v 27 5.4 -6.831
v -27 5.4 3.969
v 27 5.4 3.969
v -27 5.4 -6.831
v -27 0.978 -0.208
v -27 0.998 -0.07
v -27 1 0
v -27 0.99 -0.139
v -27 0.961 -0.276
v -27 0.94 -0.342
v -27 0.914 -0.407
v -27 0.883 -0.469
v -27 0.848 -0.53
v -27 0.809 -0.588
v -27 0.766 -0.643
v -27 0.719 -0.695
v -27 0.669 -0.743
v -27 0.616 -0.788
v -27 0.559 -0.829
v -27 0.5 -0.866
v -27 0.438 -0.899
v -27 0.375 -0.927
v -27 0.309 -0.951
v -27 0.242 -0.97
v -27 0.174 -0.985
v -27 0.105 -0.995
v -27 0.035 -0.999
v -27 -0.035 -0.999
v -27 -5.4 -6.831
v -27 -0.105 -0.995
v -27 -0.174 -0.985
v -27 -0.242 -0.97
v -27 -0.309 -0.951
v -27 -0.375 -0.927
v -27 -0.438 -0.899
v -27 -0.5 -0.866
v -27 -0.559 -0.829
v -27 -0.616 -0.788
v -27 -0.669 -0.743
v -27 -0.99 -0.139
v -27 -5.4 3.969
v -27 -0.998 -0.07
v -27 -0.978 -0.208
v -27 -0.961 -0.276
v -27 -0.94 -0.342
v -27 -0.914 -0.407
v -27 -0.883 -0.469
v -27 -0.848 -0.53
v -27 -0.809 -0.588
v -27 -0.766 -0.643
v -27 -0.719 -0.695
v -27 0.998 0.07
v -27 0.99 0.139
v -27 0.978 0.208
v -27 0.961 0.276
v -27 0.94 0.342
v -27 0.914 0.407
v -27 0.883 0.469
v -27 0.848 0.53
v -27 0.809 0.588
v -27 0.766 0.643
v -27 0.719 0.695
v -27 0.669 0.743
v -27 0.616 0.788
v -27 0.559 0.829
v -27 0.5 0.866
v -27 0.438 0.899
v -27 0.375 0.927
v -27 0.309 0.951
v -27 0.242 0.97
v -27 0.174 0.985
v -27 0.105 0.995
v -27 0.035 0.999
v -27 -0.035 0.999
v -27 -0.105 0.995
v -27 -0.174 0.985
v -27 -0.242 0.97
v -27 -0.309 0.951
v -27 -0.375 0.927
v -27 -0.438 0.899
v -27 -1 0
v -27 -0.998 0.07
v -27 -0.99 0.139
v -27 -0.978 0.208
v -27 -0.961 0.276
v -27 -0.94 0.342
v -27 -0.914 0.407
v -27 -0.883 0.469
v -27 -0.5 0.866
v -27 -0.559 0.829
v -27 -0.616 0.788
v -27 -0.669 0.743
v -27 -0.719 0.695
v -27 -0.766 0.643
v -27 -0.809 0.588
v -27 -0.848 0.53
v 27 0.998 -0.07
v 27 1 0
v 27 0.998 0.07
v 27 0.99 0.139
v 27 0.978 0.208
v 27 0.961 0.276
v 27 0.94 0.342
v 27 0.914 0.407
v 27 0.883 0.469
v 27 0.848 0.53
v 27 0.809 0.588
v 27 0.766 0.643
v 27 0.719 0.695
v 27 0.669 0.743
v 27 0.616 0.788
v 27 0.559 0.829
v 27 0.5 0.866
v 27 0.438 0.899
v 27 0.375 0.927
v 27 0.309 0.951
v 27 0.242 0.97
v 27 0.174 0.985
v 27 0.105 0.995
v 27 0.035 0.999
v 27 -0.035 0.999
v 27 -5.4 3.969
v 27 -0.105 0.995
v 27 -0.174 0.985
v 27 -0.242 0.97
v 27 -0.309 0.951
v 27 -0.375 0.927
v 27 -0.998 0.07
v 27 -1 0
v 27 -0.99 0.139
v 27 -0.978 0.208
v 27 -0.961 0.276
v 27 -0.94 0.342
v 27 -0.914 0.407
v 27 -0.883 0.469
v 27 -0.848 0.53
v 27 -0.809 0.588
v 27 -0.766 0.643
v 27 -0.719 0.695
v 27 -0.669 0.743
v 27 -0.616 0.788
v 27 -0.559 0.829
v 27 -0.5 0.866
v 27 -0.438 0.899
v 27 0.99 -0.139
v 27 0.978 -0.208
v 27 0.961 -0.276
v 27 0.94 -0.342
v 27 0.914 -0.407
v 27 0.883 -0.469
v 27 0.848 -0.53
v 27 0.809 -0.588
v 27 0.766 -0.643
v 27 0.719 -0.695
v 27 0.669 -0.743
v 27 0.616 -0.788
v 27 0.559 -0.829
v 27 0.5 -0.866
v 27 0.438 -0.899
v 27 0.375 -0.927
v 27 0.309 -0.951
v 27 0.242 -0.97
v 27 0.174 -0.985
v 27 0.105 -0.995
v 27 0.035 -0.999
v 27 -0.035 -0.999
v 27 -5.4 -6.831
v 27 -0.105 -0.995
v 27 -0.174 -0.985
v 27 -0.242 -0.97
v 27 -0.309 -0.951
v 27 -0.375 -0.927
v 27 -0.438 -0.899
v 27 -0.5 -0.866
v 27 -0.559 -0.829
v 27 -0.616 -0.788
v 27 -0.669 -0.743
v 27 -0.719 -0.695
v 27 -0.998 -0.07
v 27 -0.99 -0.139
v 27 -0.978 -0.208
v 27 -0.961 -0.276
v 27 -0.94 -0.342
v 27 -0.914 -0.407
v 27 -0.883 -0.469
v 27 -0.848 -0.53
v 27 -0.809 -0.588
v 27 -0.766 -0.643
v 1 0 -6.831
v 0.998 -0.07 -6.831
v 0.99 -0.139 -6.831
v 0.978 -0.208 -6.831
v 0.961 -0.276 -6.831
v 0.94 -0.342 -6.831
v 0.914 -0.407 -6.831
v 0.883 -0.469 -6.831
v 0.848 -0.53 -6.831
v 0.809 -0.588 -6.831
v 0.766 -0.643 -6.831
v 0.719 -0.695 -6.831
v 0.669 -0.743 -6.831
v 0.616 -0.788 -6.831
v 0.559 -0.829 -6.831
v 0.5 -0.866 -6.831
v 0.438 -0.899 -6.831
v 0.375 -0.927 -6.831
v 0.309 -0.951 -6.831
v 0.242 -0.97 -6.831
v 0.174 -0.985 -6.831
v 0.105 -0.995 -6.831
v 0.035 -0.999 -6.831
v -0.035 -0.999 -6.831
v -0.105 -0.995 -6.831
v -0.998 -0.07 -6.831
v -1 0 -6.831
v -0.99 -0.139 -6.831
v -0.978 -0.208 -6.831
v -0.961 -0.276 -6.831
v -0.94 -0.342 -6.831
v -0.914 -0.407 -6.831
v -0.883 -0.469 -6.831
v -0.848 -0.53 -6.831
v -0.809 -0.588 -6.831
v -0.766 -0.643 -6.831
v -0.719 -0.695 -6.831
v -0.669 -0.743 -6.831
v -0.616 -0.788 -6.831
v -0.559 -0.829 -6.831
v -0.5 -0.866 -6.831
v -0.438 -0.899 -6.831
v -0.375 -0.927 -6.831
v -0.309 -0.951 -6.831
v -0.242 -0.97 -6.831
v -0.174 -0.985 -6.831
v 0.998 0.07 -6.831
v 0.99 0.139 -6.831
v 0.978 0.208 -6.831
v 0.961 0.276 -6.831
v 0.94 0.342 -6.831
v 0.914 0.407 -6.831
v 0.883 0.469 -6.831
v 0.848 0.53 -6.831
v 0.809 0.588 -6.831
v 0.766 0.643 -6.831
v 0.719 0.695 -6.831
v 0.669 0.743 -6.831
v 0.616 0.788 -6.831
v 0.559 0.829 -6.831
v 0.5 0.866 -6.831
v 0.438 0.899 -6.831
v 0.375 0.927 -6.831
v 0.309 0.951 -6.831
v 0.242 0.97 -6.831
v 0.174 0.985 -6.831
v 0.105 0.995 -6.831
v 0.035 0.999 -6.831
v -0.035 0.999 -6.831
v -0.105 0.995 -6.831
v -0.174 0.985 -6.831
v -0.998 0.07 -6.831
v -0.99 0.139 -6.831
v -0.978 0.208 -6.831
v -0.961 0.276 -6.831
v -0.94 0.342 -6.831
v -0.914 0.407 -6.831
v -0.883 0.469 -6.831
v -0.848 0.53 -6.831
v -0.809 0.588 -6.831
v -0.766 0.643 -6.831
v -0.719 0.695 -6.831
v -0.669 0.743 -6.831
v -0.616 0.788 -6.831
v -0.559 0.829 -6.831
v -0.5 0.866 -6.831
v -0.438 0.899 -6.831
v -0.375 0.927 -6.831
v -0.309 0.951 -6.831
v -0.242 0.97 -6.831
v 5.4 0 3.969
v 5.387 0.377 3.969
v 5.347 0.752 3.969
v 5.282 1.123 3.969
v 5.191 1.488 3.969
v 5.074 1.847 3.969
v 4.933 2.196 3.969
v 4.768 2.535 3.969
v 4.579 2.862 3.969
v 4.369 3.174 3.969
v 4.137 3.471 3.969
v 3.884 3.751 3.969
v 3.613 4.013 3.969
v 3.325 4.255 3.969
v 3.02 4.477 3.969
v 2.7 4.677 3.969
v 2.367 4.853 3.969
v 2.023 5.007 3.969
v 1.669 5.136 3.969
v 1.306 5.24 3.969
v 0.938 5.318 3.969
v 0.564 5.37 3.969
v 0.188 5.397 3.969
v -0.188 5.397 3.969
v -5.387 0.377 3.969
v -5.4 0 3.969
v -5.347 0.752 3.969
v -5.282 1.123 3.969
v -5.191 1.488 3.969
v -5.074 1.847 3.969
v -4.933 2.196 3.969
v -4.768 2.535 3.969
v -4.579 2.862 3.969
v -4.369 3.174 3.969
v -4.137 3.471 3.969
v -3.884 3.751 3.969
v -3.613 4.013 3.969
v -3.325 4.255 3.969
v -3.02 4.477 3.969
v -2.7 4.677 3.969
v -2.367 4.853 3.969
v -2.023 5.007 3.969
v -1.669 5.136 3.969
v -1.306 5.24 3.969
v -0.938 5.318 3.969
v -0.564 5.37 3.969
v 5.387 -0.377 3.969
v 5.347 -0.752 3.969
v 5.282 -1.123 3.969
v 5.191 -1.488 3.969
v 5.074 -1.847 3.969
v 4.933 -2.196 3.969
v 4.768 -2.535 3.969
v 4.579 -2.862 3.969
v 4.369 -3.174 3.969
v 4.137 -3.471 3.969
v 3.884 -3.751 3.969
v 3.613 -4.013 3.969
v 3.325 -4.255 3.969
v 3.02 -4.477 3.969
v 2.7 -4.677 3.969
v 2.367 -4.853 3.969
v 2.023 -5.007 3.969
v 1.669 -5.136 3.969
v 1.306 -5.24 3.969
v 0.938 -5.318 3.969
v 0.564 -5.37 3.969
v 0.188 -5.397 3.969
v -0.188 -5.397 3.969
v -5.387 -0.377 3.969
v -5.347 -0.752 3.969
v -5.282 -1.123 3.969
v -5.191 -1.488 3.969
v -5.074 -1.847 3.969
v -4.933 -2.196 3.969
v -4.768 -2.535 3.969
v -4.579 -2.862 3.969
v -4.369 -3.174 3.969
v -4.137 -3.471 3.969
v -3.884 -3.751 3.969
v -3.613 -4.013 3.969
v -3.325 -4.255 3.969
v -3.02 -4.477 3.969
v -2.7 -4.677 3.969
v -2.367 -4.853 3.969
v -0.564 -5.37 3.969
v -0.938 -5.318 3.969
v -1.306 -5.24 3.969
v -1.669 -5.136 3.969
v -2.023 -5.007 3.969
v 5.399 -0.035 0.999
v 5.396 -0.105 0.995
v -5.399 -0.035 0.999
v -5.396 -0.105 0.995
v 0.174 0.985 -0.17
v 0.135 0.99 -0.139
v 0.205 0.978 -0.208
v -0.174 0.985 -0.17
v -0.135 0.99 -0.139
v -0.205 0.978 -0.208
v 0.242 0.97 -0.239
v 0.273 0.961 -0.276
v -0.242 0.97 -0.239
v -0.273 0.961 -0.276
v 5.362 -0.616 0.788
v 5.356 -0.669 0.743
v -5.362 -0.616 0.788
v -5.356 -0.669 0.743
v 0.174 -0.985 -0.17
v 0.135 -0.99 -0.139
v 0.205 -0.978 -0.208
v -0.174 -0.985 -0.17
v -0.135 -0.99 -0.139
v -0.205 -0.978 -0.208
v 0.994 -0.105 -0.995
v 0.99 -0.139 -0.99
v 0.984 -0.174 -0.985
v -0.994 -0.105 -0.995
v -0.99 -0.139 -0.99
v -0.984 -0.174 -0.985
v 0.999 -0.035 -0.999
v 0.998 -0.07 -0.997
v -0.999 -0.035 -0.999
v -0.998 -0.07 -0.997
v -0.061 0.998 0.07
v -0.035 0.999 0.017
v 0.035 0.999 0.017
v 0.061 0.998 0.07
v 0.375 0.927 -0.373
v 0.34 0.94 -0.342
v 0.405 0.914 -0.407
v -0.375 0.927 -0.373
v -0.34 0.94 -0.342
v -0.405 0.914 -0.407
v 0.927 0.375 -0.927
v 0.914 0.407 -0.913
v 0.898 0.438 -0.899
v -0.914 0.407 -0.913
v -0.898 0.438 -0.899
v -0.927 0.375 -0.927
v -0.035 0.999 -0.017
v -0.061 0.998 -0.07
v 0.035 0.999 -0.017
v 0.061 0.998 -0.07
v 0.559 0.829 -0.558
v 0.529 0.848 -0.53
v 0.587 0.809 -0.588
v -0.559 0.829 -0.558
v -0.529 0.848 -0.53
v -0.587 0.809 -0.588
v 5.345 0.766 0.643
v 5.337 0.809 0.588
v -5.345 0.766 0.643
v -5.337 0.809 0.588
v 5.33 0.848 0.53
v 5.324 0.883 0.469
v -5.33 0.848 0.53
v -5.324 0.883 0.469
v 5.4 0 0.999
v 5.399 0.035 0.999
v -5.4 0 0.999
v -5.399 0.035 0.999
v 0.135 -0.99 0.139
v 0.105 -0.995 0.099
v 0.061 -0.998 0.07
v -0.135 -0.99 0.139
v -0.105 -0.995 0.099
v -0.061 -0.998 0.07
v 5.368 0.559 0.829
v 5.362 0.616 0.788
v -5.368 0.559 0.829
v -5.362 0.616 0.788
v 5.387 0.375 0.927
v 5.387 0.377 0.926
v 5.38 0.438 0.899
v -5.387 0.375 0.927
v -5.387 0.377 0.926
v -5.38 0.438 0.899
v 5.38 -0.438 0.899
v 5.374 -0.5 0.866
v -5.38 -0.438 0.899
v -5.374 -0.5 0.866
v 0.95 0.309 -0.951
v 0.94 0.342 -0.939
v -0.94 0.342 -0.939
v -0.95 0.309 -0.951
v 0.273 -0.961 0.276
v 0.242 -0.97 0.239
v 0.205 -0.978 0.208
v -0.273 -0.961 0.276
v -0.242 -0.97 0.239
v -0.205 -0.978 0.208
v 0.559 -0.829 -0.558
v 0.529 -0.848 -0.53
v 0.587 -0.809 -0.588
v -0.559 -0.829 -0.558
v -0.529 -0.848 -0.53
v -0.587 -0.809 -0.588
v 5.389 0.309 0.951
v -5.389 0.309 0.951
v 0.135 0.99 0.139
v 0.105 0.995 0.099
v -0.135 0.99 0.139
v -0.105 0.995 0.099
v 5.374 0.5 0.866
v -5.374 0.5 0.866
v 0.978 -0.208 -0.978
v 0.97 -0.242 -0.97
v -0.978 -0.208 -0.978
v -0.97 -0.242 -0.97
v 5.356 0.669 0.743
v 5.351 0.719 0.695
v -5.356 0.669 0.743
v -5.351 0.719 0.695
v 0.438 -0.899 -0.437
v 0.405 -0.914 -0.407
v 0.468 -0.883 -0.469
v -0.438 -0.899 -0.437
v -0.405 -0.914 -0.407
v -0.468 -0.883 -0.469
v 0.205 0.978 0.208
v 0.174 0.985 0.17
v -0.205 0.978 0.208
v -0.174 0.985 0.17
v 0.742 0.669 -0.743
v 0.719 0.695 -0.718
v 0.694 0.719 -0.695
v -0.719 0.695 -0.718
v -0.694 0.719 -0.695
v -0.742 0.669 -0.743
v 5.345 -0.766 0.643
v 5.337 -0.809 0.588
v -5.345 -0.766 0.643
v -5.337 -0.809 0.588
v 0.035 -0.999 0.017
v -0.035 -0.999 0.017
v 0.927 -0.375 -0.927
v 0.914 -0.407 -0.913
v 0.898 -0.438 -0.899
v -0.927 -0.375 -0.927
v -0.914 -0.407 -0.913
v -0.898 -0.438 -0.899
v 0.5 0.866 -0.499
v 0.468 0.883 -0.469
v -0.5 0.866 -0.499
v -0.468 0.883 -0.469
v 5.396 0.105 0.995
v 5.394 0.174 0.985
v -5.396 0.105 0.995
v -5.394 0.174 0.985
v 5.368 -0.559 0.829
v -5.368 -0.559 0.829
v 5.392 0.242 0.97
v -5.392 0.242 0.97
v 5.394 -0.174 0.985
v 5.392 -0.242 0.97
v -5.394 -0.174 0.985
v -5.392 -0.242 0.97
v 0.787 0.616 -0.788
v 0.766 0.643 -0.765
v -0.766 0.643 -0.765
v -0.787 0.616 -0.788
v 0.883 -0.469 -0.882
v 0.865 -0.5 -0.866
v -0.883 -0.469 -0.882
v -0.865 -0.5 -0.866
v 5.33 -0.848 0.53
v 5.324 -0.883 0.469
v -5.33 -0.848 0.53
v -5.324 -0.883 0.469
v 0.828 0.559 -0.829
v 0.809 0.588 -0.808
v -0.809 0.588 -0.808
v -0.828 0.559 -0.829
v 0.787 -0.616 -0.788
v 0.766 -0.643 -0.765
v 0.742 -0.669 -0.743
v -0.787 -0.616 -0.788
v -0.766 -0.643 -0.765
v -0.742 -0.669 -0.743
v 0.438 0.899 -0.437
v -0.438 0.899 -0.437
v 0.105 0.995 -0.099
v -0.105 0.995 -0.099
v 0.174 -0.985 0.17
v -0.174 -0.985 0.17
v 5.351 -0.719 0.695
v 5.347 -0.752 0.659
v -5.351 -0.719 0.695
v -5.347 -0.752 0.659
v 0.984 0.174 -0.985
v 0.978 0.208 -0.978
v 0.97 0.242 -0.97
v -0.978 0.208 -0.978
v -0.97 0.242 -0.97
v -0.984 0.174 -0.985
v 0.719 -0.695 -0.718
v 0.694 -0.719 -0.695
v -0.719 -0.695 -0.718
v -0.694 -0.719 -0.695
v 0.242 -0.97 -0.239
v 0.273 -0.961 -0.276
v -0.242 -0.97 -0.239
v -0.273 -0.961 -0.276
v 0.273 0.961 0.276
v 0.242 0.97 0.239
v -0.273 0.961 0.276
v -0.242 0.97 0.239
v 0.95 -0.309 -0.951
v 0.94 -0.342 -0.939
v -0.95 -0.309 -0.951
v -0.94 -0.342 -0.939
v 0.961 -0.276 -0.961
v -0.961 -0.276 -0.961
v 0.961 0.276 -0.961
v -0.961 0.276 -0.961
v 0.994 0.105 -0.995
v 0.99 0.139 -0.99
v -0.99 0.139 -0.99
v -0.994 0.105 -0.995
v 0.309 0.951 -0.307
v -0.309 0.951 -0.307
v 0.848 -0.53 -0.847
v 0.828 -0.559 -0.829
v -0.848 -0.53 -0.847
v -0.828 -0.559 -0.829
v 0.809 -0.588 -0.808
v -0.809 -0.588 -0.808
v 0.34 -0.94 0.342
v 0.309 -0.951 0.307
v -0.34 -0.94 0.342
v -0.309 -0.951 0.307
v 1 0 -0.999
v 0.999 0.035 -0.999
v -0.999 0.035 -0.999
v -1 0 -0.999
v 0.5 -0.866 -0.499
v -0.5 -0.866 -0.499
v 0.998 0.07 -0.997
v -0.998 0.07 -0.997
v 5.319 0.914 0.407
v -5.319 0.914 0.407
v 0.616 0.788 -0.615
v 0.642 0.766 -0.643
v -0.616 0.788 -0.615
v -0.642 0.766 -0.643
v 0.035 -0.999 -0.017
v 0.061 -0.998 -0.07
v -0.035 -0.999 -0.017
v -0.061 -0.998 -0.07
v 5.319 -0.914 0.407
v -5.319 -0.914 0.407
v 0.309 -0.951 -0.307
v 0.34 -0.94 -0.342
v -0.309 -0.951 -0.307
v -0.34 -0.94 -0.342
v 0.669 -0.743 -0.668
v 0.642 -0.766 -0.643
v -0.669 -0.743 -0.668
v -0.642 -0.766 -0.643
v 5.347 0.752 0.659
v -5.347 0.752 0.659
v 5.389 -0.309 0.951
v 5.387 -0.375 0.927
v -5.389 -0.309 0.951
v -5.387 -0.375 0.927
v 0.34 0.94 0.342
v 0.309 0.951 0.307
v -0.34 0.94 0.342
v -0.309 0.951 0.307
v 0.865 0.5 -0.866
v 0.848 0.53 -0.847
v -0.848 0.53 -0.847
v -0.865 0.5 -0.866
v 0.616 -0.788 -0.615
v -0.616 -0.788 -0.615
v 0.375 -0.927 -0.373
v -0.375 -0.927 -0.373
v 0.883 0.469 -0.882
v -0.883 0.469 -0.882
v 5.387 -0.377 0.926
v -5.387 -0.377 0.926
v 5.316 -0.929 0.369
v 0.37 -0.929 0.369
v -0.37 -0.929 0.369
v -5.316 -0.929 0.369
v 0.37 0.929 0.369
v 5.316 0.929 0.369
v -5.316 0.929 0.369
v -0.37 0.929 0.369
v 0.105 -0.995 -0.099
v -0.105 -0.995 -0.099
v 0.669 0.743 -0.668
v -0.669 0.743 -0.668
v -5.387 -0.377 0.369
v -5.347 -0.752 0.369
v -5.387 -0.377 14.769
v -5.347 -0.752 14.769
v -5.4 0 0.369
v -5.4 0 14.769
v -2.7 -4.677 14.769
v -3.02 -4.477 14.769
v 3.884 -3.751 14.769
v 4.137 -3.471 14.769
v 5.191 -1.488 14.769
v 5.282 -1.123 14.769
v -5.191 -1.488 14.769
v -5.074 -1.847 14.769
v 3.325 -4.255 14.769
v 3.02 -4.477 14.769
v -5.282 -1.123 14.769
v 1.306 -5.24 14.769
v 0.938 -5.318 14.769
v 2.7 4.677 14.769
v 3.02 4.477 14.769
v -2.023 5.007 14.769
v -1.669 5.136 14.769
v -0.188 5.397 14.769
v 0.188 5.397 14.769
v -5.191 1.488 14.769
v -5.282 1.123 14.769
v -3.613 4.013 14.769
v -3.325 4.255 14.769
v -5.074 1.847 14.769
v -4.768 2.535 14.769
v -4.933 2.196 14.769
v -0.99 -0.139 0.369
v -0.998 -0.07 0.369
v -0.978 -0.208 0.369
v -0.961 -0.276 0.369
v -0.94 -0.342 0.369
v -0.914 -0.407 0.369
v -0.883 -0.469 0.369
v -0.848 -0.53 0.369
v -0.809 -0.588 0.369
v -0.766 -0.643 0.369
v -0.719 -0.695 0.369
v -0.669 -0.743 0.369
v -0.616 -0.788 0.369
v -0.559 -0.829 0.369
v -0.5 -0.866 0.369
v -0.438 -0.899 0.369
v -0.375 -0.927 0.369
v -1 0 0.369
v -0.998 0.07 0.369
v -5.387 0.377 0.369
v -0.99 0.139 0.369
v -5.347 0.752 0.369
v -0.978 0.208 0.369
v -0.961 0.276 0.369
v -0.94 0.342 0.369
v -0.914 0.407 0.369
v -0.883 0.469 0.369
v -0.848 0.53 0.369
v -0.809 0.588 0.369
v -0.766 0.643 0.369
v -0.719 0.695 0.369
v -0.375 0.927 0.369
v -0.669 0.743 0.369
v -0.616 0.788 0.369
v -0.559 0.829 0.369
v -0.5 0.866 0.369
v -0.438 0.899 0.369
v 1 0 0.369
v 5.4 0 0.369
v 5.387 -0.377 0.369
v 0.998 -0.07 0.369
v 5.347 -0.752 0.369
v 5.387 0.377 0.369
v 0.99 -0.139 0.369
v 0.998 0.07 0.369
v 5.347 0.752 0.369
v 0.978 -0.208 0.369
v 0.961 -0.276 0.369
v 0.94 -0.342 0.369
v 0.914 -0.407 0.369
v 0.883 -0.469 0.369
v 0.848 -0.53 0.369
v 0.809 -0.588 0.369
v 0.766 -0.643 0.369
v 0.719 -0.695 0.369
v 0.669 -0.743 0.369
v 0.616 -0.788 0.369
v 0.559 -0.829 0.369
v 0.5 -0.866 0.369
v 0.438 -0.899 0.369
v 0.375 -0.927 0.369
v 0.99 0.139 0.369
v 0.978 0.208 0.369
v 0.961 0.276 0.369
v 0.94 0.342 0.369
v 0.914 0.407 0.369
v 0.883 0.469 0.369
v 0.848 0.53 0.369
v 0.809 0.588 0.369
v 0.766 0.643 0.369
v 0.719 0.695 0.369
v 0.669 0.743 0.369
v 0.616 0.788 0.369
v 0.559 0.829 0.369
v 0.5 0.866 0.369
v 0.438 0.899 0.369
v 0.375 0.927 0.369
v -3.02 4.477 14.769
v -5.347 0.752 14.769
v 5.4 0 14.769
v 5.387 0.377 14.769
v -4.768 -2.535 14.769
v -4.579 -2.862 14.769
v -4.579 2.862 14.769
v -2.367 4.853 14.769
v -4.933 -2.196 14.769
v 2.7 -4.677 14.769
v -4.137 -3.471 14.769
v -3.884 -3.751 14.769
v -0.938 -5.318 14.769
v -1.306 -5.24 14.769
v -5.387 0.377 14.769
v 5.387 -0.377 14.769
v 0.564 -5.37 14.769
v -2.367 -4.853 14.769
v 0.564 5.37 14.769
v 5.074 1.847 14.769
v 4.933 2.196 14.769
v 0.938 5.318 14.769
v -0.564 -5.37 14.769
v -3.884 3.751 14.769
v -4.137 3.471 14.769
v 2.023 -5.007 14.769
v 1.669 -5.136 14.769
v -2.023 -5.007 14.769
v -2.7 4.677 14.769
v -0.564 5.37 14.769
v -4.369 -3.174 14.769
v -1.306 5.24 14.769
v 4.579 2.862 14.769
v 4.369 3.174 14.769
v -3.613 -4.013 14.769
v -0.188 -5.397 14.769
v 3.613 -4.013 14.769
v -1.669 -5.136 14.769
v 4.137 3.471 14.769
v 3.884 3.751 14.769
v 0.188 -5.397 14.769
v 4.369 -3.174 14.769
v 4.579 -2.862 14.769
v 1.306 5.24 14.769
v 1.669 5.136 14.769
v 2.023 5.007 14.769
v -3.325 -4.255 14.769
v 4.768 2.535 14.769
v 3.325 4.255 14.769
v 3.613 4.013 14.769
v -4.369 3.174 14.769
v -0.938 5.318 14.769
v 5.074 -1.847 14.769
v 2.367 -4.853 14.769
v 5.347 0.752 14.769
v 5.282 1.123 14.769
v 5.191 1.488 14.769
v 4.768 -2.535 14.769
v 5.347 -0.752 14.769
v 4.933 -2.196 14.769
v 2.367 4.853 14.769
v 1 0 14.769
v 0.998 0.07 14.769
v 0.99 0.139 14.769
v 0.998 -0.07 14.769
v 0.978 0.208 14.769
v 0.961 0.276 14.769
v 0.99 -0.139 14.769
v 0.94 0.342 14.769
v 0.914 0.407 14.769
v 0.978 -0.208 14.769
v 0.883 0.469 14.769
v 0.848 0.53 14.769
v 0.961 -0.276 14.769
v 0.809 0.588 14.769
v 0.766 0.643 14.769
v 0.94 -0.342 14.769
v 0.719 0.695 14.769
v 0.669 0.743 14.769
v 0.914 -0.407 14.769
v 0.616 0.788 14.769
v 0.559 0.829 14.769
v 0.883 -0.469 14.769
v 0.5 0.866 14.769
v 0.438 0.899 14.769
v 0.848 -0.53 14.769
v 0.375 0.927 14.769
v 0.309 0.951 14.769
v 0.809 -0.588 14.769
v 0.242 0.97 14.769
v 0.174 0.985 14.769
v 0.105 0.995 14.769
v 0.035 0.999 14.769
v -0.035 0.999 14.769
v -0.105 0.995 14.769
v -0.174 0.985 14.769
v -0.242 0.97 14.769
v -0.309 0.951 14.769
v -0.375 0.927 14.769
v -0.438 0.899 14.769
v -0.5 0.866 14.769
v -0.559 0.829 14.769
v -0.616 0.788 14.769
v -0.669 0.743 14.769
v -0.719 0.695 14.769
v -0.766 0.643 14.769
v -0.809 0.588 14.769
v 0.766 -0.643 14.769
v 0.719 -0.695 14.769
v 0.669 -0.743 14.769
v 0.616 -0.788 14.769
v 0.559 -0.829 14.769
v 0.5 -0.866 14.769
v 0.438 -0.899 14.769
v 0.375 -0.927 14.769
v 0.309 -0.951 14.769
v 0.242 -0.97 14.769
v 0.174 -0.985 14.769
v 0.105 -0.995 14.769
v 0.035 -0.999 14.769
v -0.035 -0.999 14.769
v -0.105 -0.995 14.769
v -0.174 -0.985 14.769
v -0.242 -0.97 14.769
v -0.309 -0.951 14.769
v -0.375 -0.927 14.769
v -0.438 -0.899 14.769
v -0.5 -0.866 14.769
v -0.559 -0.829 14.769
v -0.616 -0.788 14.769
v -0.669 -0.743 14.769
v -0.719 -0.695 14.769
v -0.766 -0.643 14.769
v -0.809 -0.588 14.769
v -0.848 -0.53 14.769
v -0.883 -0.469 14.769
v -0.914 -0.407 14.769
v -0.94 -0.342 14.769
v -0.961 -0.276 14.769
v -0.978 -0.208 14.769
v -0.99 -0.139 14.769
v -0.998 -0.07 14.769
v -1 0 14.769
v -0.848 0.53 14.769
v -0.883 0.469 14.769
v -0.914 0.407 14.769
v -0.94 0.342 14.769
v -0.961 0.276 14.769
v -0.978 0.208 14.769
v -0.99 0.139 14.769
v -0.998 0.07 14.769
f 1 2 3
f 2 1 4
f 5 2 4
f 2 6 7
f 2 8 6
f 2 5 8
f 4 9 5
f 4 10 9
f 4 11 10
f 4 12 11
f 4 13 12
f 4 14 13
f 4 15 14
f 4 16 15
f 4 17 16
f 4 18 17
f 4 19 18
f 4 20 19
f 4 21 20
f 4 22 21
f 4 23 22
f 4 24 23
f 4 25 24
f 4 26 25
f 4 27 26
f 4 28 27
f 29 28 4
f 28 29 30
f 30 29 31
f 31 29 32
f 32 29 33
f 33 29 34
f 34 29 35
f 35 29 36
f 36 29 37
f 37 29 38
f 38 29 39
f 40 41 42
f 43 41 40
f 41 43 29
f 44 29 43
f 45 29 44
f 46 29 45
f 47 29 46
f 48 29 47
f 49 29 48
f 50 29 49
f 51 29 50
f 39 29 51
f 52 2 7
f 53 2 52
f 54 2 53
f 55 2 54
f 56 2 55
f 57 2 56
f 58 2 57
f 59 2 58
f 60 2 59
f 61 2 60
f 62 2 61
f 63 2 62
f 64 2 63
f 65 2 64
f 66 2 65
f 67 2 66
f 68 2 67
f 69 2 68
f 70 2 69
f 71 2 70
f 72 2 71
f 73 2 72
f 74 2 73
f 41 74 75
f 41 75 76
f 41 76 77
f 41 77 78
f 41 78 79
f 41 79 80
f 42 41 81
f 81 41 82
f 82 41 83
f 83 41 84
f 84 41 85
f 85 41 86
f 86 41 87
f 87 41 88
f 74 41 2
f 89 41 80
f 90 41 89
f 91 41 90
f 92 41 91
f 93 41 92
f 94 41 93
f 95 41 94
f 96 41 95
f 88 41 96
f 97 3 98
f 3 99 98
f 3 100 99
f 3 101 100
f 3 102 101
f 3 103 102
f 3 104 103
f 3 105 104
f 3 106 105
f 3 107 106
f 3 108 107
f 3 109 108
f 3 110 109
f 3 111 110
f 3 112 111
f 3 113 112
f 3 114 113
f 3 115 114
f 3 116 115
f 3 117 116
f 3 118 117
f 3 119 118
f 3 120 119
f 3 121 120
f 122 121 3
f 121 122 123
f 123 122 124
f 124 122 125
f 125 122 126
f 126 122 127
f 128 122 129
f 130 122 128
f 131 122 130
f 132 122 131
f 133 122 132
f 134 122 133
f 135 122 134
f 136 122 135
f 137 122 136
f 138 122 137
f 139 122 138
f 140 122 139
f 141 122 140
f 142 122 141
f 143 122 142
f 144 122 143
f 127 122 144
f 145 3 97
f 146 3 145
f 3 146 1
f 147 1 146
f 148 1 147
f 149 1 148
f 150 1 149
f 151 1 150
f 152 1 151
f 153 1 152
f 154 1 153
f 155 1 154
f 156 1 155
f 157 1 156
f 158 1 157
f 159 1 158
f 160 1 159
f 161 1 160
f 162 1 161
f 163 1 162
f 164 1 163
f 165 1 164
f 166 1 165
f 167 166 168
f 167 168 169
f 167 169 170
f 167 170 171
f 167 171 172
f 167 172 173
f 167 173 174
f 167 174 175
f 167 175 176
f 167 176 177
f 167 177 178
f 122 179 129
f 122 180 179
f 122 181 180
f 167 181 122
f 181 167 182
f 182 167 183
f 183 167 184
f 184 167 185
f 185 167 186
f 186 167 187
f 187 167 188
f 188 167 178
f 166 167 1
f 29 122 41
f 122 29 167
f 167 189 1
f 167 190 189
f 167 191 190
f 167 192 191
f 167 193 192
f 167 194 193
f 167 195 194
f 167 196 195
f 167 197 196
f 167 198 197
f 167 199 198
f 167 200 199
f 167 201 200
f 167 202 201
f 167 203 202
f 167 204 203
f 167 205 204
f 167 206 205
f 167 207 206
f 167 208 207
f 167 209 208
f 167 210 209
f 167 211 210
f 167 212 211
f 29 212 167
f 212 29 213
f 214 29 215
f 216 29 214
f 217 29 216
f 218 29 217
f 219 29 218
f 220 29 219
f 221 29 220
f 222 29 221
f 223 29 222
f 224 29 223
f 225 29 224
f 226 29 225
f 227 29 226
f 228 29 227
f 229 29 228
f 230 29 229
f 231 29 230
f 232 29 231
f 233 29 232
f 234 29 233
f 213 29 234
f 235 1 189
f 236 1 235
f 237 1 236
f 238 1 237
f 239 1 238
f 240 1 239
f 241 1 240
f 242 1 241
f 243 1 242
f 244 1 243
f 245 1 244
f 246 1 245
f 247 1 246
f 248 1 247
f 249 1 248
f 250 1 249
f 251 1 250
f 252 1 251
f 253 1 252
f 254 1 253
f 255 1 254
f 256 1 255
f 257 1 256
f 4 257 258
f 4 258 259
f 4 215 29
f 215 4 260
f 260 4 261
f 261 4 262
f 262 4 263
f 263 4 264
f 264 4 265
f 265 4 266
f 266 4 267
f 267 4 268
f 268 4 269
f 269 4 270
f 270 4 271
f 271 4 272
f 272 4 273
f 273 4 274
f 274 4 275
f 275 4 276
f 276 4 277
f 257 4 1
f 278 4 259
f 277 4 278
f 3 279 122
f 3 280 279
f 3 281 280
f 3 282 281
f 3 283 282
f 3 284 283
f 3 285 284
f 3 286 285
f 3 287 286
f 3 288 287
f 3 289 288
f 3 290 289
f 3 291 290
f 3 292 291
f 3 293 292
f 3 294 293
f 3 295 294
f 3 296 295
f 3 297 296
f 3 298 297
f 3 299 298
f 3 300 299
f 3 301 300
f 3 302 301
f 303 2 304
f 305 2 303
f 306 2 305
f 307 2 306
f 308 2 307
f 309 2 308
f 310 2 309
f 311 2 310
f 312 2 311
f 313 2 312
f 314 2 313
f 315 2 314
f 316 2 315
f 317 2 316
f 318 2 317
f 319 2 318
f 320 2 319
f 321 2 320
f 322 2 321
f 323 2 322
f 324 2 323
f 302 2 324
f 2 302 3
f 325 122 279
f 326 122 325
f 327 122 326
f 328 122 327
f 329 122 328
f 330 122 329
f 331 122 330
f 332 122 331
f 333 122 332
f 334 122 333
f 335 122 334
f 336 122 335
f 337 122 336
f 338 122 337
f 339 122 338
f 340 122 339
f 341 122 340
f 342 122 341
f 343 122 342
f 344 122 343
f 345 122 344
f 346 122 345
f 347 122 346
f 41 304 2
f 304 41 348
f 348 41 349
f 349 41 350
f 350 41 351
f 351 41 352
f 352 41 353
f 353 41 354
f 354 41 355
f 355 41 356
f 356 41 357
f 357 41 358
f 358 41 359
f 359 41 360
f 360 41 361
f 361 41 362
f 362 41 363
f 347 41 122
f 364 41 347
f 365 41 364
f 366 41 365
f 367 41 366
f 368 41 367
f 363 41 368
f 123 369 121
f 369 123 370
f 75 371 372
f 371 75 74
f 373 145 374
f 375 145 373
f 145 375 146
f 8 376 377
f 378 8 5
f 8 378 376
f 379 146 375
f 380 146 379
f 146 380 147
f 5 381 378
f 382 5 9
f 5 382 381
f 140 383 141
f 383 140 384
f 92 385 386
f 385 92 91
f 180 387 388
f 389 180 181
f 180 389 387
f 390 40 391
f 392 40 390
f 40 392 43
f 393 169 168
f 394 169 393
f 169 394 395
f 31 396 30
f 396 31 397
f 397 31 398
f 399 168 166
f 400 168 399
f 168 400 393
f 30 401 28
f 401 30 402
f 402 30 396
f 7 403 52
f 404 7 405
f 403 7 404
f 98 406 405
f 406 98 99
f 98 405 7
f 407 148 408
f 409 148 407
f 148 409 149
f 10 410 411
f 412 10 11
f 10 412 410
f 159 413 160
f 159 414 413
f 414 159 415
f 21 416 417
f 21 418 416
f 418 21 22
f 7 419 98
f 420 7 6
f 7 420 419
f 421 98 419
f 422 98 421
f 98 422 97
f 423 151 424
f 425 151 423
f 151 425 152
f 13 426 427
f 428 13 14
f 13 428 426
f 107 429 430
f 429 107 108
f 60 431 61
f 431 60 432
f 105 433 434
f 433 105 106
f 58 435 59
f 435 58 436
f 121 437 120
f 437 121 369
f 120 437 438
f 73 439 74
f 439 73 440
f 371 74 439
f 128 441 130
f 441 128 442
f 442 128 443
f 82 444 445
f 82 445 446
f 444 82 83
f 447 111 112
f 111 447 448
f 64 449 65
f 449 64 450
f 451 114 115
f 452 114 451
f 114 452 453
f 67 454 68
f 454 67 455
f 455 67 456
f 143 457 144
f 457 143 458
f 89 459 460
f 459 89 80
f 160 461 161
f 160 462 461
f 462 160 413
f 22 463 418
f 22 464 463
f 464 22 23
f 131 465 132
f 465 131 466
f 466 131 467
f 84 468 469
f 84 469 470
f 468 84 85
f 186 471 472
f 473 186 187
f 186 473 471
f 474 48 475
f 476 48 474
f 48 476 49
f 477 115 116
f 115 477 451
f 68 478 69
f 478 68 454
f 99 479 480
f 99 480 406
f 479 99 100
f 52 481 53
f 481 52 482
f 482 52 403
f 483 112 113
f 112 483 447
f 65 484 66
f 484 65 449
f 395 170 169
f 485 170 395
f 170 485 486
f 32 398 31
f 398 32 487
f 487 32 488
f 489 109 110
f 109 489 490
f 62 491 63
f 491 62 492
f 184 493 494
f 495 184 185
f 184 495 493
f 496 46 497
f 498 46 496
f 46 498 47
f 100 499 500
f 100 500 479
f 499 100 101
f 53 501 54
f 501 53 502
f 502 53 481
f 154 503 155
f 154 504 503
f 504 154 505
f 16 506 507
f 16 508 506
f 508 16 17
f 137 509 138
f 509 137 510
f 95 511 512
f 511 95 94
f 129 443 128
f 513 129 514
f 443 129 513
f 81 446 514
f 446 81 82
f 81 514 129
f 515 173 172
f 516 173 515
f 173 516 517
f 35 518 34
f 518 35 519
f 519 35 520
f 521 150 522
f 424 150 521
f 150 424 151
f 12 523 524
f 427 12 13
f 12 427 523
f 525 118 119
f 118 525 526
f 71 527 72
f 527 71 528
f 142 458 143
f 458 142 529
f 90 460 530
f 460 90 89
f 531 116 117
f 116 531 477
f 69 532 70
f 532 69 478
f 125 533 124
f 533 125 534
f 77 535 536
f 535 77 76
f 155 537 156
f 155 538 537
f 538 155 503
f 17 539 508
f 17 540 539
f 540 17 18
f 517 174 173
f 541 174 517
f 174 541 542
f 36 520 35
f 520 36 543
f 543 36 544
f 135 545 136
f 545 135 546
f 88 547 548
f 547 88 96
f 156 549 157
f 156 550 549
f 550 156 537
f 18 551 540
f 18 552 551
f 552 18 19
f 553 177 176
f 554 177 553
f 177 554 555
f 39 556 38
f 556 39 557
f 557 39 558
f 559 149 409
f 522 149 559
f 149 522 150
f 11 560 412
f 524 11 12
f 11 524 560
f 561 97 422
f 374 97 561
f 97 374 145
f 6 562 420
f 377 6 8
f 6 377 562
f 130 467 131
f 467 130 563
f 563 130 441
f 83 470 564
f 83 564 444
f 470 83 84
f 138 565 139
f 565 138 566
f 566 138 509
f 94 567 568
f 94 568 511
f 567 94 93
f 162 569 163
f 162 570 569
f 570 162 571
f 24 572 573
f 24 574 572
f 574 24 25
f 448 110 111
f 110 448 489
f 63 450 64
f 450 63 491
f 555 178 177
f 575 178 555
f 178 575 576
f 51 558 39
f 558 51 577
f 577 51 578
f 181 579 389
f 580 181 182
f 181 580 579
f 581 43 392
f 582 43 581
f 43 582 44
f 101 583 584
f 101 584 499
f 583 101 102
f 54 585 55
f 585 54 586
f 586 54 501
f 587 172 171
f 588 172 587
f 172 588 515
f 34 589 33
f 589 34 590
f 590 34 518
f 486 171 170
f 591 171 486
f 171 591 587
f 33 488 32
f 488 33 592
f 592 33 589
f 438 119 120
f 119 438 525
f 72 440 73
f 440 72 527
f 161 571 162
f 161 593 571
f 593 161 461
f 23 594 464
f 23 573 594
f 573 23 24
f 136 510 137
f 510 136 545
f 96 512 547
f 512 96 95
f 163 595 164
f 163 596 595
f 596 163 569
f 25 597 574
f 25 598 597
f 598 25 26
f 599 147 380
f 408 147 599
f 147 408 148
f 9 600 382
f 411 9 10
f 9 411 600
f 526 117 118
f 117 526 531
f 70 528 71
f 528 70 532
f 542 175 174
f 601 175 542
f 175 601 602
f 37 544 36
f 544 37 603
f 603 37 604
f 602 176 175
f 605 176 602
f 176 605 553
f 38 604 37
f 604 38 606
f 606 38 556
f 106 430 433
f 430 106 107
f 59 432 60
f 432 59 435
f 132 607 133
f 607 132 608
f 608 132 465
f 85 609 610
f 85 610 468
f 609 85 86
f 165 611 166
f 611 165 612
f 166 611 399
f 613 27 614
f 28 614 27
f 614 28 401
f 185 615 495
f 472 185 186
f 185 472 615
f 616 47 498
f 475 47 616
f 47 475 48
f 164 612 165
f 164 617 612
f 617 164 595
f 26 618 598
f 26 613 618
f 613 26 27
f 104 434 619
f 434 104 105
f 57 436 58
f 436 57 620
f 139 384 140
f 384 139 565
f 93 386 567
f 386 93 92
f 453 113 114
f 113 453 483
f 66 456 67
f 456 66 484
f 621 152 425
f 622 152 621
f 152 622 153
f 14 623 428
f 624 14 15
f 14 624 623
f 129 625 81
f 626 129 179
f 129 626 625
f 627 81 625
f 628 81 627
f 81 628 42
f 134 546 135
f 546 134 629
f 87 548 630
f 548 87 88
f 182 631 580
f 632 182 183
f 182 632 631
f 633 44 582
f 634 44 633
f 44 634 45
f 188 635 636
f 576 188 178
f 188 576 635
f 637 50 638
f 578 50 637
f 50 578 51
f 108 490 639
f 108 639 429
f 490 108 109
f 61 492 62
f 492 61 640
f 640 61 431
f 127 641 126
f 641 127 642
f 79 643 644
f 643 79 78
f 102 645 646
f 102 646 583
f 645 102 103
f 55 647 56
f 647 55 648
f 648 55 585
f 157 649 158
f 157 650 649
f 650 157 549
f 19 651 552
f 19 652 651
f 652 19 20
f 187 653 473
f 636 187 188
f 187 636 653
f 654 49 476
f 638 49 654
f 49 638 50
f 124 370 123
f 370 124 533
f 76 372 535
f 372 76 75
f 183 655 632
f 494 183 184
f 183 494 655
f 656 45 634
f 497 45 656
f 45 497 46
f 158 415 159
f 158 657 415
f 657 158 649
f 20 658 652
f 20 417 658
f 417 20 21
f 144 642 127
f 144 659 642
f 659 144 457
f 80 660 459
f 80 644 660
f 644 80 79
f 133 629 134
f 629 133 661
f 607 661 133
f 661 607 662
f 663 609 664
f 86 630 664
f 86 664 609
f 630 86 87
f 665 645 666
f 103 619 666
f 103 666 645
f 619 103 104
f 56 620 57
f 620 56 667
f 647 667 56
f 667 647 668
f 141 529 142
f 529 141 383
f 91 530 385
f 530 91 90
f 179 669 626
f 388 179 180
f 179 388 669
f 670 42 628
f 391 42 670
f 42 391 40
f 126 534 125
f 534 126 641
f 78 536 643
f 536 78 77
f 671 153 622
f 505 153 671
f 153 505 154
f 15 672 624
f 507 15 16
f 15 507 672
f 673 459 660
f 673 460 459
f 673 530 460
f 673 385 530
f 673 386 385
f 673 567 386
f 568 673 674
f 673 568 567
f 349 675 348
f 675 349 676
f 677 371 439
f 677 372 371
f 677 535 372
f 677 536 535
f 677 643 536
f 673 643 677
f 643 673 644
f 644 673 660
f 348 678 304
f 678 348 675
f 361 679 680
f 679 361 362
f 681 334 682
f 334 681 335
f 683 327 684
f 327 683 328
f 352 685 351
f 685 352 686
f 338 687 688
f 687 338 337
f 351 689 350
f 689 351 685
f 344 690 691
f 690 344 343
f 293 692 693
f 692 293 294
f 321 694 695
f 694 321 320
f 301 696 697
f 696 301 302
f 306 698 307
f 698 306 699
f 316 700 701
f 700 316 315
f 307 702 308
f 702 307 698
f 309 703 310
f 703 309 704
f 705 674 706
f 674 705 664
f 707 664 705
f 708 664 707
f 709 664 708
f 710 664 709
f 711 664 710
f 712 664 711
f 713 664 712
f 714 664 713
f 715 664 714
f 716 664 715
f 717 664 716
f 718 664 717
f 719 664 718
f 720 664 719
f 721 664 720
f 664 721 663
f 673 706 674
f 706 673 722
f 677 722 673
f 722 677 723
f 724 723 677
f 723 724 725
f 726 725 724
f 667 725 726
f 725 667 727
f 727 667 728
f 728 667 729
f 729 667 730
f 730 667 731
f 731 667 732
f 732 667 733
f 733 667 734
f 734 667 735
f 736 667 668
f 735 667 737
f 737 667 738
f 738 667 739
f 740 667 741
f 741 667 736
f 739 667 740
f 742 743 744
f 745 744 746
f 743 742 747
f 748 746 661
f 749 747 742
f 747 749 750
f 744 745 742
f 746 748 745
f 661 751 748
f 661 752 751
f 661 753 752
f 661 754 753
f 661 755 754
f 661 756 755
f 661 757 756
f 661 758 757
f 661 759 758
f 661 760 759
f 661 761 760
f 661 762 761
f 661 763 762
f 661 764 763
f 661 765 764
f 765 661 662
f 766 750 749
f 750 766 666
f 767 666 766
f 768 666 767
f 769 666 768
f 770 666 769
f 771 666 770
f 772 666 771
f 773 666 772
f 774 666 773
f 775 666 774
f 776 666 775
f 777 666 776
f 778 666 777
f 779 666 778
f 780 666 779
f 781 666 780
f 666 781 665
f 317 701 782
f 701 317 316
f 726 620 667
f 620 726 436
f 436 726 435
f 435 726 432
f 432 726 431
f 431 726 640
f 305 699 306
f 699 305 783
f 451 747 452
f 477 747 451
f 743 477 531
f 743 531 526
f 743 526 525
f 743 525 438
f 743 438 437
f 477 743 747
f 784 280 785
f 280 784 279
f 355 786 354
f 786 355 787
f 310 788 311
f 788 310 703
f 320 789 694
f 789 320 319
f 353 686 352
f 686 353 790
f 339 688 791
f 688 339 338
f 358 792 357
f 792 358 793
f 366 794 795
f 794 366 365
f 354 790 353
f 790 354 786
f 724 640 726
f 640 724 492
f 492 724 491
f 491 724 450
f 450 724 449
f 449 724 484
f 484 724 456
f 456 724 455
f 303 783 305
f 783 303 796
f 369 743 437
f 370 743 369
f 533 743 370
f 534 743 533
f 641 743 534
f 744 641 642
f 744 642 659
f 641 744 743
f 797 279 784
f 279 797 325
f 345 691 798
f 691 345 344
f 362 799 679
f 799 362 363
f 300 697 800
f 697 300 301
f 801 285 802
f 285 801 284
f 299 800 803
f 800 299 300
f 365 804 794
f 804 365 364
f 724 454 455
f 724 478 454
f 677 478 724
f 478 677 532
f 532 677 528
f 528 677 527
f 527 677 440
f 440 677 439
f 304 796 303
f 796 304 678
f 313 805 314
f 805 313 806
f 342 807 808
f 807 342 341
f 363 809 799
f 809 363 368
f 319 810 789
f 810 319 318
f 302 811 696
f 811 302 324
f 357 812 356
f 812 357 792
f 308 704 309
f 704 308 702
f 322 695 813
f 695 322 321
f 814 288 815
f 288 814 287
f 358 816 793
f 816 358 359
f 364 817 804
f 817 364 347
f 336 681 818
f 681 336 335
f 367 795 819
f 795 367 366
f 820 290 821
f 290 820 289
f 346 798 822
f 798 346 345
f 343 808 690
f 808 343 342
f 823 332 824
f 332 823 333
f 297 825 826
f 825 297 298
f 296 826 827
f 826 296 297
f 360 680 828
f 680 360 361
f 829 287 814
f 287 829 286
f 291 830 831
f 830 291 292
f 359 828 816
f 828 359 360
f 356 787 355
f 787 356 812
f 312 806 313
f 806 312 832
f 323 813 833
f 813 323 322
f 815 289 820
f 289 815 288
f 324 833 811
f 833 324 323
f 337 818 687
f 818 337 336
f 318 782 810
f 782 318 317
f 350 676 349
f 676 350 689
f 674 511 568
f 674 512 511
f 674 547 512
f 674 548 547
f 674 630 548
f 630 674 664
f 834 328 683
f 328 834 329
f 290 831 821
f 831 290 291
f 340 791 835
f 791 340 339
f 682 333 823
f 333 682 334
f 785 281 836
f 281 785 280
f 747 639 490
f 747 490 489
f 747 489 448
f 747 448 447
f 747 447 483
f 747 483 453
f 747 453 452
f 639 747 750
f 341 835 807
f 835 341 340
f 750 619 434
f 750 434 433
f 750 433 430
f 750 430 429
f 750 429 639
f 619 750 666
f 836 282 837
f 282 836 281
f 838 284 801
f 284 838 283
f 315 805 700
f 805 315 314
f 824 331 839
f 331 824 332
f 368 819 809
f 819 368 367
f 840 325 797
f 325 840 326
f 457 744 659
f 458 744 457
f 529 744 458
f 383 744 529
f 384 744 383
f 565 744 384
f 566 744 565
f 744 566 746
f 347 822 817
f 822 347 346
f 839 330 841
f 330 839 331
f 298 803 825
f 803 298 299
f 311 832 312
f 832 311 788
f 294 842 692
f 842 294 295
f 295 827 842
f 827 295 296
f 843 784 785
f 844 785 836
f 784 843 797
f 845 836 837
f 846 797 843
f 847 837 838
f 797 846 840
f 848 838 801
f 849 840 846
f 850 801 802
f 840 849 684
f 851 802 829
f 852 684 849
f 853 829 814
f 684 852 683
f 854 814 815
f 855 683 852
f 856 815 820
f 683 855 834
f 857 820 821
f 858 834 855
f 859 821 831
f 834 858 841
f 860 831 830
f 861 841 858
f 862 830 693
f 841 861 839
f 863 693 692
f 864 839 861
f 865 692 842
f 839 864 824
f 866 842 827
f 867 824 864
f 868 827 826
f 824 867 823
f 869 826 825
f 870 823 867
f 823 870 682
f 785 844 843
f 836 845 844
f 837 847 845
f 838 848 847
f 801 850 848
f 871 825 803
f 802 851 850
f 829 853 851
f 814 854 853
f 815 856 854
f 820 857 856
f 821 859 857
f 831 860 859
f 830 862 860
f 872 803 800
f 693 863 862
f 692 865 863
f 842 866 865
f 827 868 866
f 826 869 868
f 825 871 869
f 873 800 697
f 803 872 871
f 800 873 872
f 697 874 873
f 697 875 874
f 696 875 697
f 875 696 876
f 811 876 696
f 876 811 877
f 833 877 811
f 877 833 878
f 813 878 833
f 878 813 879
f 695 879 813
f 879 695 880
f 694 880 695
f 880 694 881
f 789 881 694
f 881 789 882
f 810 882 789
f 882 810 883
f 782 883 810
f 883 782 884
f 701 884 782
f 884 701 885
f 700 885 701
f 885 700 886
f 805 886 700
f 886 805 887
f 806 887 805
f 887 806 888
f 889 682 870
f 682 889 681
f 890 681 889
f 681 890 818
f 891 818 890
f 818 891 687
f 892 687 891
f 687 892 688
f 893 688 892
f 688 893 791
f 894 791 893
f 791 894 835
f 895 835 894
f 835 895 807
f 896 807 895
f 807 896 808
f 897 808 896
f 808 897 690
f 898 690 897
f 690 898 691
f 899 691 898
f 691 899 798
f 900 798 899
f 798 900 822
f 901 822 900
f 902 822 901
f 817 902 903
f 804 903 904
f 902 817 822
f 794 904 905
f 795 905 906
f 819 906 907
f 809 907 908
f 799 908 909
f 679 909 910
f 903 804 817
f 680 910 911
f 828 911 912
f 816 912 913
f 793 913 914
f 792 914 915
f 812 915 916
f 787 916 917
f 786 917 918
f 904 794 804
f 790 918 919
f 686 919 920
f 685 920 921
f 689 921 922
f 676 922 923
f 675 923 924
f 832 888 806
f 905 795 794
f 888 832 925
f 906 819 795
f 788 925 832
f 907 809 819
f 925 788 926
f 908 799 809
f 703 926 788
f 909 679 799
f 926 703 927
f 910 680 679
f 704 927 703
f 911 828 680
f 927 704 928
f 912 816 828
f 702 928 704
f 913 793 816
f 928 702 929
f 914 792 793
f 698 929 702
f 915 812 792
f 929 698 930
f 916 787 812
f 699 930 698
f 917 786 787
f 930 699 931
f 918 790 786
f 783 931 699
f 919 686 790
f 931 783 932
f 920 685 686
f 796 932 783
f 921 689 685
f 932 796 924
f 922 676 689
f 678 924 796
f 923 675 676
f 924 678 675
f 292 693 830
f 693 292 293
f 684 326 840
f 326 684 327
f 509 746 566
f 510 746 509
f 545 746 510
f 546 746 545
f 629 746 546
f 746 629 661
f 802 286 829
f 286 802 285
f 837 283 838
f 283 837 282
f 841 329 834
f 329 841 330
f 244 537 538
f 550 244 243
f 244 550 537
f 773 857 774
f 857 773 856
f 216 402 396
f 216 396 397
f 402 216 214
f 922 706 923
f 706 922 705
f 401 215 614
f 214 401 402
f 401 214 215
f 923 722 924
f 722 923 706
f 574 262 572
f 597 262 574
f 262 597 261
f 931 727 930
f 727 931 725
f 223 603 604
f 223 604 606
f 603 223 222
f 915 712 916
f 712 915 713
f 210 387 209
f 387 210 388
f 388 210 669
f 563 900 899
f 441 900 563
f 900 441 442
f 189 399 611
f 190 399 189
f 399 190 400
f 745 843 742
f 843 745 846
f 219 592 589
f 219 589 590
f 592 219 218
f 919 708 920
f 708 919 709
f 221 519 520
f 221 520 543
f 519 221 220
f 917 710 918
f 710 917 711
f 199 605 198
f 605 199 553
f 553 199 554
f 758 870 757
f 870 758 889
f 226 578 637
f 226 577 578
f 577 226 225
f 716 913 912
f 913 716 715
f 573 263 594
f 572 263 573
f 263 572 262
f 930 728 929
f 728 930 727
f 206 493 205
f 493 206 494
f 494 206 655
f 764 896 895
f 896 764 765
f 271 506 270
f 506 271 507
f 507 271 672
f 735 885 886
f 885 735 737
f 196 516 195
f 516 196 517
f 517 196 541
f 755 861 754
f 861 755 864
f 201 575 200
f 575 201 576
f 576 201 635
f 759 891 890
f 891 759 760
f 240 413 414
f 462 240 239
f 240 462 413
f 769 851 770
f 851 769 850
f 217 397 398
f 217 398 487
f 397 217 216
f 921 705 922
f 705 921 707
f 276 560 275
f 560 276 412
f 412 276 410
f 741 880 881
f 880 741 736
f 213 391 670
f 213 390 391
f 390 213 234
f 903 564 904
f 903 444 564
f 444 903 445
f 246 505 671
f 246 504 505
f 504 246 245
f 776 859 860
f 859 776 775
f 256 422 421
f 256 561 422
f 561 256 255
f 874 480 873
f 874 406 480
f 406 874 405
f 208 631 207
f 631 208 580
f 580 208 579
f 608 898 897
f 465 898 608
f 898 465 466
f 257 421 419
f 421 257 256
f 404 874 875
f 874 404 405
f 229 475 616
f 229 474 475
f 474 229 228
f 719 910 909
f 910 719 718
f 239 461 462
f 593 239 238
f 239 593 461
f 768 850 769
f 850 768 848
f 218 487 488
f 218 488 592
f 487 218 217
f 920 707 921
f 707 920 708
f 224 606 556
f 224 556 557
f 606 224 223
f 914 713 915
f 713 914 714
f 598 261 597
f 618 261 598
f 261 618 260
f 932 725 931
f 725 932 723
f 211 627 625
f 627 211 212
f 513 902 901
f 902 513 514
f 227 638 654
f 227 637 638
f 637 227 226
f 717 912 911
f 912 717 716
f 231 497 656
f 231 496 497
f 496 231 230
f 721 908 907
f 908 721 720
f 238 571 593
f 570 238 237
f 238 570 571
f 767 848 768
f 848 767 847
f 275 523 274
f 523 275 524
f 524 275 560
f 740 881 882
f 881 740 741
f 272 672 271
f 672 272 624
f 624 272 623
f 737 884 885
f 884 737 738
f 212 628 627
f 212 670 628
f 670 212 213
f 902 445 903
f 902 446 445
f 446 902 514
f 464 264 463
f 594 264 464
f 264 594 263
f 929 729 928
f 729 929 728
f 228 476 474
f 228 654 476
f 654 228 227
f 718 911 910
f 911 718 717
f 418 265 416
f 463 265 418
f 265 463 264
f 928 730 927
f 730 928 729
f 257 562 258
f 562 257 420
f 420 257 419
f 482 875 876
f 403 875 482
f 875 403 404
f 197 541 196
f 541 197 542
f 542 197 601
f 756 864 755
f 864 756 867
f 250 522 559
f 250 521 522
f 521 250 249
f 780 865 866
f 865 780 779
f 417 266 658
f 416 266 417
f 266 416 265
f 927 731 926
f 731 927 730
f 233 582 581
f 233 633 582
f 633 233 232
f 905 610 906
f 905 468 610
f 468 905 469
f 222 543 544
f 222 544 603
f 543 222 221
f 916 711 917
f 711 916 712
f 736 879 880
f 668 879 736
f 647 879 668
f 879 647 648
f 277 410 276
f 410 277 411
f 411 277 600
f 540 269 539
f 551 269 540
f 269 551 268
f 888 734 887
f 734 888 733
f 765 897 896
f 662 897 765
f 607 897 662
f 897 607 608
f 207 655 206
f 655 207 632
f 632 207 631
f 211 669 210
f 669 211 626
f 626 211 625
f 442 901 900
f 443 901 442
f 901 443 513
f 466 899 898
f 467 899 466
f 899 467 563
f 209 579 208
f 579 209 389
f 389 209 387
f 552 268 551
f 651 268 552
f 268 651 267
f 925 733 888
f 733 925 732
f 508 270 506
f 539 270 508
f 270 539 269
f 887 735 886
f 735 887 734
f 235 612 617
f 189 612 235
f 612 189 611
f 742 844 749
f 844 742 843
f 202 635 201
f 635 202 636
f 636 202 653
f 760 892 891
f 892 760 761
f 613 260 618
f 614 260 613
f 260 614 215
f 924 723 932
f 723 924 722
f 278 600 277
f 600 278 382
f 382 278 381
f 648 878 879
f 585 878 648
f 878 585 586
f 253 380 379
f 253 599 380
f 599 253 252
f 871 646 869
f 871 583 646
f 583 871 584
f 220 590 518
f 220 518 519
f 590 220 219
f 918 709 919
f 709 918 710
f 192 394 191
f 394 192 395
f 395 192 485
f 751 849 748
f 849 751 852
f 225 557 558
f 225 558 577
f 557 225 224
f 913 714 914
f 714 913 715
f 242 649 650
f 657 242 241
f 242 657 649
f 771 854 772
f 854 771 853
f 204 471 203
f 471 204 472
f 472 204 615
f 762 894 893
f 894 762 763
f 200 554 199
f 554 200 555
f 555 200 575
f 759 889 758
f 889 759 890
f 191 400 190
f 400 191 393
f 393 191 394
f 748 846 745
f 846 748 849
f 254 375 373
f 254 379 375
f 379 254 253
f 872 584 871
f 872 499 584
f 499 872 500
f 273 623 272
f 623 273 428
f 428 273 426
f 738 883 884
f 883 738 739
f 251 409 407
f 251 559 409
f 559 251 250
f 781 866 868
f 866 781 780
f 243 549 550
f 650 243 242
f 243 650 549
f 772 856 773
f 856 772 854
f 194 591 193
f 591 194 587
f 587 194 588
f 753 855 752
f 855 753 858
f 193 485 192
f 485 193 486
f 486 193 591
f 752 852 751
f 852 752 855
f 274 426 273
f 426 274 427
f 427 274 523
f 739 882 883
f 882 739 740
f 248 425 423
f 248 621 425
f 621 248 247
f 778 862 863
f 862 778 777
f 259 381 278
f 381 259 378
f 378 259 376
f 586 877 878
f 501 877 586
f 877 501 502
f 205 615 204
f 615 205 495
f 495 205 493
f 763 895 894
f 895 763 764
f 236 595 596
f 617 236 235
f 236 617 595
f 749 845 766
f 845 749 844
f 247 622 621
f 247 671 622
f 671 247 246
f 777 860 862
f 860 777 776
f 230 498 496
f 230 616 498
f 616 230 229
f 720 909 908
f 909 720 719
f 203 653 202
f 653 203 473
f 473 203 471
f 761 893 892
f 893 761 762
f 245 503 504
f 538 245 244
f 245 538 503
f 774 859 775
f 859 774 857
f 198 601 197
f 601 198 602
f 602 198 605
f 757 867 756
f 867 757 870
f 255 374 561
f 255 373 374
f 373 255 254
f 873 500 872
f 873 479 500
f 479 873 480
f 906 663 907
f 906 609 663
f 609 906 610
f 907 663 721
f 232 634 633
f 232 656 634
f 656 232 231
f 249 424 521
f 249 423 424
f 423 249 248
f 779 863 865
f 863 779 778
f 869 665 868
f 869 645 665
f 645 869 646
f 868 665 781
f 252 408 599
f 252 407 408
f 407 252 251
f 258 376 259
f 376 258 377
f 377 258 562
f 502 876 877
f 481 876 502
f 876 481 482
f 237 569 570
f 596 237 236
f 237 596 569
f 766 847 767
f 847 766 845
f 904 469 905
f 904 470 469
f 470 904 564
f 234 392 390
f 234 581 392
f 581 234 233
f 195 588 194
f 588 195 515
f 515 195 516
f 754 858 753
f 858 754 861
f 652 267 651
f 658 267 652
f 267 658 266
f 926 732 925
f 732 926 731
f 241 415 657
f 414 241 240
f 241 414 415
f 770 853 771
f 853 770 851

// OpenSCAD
$fn = 90;

/* https://www.youtube.com/watch?v=e9wGPh-iiRw&list=PLvKkSzWgY7KUUSYDqHVdv0mst4nBnLe64&index=1
  https://en.wikipedia.org/wiki/Tennis_racket_theorem
  
  
  PRINT https://en.wikipedia.org/wiki/Tippe_top
  https://www.youtube.com/watch?v=V7hGcLU_wlY
  https://www.thingiverse.com/search?q=Tippe+top&type=things&sort=relevant
*/
rind_width = 8;
ring_d = 60;
ring_scale = 0.1;
hole_d = 2;

module angle() { 
    translate([-ring_d*(1+ring_scale)/2+rind_width/2,-7/2-hole_d/2,rind_width/2]) difference() {
        cube([7,7,1.2], center = true);
        translate([10,0,0])rotate([0,0,-30]) cube([20,20,2], center = true);
        translate([0,-10,0]) cube([20,20,2], center = true);
    }
}
//cube([10,10,10]); // scale cube

*union() { // spin top'
  translate([0,-ring_d*0.6,rind_width/2]) rotate([90,0,0]) cylinder(h = 20, d = 7, center = true); // axis
    difference() {
        union() {
            scale([1 + ring_scale,1 - ring_scale, 1]) difference() {
                cylinder(d = ring_d + rind_width, h = rind_width);
                cylinder(d = ring_d, h = rind_width);
            }
            //translate([0,-20,rind_width/2]) rotate([-90,0,0]) cylinder(d1 = 0, d2 = 16, h = 8); // bottom cone
        }
        translate([0,53,0]) cube([100,100,100], center = true);
        translate([0,0,rind_width/2]) rotate([0,90,0]) cylinder(d = hole_d, h = 100, center = true);
        translate([0,-7,rind_width/2]) cube([1.6,14,8], center = true);
    }
    //angle();
    //translate([0,0,+rind_width/2]) rotate([0,180,0]) translate([0,0,-rind_width/2]) angle();
}



// round moving part
*union() {
    difference() {
        translate([0,0,rind_width/2]) rotate([0,90,0]) cylinder(d = 6, h = 30, center = true);
        translate([0,0,rind_width/2]) rotate([0,90,0]) cylinder(d = hole_d, h = 100, center = true); // hole
    }
    translate([0,-5,rind_width/2]) rotate([90,0,0]) cylinder(d = 6, h = 10, center = true);
    translate([0,5.5,rind_width/2]) cube([1.2,11,6], center = true);
}

d = 6*1.8;
h = 4*1.8;
rotate([-90,0,180]) translate([0,1.4614-0.03,-d/2])
difference() {
  union() {
    difference() {
        translate([0,0,d/2]) rotate([0,90,0]) cube([d,d,d*5], center = true);
        translate([0,-1.4614+0.03,d/2]) rotate([0,90,0]) cylinder(d = hole_d, h = 100, center = true); // hole
    }
    translate([0,-d/2-h/2,d/2]) rotate([90,0,0]) cylinder(d = d, h = h*2, center = true);
    //translate([0,-d/2-h/2,rind_width/2]) rotate([90,0,0]) cylinder(d = d, h = h, center = true);
    //translate([0,+d/2+h,rind_width/2]) rotate([90,0,0]) cylinder(d = d/1.4142, h = h*2, center = true);
  }
  translate([0,0,d/2]) rotate([90,0,0]) cylinder(d = hole_d, h = 100, center = true); // hole
}

/*
from stl import mesh
your_mesh = mesh.Mesh.from_file('dzhanibekov2.stl')
volume, cog, inertia = your_mesh.get_mass_properties()
print("Volume                                  = {0}".format(volume))
print("Position of the center of gravity (COG) = {0}".format(cog))
*/
